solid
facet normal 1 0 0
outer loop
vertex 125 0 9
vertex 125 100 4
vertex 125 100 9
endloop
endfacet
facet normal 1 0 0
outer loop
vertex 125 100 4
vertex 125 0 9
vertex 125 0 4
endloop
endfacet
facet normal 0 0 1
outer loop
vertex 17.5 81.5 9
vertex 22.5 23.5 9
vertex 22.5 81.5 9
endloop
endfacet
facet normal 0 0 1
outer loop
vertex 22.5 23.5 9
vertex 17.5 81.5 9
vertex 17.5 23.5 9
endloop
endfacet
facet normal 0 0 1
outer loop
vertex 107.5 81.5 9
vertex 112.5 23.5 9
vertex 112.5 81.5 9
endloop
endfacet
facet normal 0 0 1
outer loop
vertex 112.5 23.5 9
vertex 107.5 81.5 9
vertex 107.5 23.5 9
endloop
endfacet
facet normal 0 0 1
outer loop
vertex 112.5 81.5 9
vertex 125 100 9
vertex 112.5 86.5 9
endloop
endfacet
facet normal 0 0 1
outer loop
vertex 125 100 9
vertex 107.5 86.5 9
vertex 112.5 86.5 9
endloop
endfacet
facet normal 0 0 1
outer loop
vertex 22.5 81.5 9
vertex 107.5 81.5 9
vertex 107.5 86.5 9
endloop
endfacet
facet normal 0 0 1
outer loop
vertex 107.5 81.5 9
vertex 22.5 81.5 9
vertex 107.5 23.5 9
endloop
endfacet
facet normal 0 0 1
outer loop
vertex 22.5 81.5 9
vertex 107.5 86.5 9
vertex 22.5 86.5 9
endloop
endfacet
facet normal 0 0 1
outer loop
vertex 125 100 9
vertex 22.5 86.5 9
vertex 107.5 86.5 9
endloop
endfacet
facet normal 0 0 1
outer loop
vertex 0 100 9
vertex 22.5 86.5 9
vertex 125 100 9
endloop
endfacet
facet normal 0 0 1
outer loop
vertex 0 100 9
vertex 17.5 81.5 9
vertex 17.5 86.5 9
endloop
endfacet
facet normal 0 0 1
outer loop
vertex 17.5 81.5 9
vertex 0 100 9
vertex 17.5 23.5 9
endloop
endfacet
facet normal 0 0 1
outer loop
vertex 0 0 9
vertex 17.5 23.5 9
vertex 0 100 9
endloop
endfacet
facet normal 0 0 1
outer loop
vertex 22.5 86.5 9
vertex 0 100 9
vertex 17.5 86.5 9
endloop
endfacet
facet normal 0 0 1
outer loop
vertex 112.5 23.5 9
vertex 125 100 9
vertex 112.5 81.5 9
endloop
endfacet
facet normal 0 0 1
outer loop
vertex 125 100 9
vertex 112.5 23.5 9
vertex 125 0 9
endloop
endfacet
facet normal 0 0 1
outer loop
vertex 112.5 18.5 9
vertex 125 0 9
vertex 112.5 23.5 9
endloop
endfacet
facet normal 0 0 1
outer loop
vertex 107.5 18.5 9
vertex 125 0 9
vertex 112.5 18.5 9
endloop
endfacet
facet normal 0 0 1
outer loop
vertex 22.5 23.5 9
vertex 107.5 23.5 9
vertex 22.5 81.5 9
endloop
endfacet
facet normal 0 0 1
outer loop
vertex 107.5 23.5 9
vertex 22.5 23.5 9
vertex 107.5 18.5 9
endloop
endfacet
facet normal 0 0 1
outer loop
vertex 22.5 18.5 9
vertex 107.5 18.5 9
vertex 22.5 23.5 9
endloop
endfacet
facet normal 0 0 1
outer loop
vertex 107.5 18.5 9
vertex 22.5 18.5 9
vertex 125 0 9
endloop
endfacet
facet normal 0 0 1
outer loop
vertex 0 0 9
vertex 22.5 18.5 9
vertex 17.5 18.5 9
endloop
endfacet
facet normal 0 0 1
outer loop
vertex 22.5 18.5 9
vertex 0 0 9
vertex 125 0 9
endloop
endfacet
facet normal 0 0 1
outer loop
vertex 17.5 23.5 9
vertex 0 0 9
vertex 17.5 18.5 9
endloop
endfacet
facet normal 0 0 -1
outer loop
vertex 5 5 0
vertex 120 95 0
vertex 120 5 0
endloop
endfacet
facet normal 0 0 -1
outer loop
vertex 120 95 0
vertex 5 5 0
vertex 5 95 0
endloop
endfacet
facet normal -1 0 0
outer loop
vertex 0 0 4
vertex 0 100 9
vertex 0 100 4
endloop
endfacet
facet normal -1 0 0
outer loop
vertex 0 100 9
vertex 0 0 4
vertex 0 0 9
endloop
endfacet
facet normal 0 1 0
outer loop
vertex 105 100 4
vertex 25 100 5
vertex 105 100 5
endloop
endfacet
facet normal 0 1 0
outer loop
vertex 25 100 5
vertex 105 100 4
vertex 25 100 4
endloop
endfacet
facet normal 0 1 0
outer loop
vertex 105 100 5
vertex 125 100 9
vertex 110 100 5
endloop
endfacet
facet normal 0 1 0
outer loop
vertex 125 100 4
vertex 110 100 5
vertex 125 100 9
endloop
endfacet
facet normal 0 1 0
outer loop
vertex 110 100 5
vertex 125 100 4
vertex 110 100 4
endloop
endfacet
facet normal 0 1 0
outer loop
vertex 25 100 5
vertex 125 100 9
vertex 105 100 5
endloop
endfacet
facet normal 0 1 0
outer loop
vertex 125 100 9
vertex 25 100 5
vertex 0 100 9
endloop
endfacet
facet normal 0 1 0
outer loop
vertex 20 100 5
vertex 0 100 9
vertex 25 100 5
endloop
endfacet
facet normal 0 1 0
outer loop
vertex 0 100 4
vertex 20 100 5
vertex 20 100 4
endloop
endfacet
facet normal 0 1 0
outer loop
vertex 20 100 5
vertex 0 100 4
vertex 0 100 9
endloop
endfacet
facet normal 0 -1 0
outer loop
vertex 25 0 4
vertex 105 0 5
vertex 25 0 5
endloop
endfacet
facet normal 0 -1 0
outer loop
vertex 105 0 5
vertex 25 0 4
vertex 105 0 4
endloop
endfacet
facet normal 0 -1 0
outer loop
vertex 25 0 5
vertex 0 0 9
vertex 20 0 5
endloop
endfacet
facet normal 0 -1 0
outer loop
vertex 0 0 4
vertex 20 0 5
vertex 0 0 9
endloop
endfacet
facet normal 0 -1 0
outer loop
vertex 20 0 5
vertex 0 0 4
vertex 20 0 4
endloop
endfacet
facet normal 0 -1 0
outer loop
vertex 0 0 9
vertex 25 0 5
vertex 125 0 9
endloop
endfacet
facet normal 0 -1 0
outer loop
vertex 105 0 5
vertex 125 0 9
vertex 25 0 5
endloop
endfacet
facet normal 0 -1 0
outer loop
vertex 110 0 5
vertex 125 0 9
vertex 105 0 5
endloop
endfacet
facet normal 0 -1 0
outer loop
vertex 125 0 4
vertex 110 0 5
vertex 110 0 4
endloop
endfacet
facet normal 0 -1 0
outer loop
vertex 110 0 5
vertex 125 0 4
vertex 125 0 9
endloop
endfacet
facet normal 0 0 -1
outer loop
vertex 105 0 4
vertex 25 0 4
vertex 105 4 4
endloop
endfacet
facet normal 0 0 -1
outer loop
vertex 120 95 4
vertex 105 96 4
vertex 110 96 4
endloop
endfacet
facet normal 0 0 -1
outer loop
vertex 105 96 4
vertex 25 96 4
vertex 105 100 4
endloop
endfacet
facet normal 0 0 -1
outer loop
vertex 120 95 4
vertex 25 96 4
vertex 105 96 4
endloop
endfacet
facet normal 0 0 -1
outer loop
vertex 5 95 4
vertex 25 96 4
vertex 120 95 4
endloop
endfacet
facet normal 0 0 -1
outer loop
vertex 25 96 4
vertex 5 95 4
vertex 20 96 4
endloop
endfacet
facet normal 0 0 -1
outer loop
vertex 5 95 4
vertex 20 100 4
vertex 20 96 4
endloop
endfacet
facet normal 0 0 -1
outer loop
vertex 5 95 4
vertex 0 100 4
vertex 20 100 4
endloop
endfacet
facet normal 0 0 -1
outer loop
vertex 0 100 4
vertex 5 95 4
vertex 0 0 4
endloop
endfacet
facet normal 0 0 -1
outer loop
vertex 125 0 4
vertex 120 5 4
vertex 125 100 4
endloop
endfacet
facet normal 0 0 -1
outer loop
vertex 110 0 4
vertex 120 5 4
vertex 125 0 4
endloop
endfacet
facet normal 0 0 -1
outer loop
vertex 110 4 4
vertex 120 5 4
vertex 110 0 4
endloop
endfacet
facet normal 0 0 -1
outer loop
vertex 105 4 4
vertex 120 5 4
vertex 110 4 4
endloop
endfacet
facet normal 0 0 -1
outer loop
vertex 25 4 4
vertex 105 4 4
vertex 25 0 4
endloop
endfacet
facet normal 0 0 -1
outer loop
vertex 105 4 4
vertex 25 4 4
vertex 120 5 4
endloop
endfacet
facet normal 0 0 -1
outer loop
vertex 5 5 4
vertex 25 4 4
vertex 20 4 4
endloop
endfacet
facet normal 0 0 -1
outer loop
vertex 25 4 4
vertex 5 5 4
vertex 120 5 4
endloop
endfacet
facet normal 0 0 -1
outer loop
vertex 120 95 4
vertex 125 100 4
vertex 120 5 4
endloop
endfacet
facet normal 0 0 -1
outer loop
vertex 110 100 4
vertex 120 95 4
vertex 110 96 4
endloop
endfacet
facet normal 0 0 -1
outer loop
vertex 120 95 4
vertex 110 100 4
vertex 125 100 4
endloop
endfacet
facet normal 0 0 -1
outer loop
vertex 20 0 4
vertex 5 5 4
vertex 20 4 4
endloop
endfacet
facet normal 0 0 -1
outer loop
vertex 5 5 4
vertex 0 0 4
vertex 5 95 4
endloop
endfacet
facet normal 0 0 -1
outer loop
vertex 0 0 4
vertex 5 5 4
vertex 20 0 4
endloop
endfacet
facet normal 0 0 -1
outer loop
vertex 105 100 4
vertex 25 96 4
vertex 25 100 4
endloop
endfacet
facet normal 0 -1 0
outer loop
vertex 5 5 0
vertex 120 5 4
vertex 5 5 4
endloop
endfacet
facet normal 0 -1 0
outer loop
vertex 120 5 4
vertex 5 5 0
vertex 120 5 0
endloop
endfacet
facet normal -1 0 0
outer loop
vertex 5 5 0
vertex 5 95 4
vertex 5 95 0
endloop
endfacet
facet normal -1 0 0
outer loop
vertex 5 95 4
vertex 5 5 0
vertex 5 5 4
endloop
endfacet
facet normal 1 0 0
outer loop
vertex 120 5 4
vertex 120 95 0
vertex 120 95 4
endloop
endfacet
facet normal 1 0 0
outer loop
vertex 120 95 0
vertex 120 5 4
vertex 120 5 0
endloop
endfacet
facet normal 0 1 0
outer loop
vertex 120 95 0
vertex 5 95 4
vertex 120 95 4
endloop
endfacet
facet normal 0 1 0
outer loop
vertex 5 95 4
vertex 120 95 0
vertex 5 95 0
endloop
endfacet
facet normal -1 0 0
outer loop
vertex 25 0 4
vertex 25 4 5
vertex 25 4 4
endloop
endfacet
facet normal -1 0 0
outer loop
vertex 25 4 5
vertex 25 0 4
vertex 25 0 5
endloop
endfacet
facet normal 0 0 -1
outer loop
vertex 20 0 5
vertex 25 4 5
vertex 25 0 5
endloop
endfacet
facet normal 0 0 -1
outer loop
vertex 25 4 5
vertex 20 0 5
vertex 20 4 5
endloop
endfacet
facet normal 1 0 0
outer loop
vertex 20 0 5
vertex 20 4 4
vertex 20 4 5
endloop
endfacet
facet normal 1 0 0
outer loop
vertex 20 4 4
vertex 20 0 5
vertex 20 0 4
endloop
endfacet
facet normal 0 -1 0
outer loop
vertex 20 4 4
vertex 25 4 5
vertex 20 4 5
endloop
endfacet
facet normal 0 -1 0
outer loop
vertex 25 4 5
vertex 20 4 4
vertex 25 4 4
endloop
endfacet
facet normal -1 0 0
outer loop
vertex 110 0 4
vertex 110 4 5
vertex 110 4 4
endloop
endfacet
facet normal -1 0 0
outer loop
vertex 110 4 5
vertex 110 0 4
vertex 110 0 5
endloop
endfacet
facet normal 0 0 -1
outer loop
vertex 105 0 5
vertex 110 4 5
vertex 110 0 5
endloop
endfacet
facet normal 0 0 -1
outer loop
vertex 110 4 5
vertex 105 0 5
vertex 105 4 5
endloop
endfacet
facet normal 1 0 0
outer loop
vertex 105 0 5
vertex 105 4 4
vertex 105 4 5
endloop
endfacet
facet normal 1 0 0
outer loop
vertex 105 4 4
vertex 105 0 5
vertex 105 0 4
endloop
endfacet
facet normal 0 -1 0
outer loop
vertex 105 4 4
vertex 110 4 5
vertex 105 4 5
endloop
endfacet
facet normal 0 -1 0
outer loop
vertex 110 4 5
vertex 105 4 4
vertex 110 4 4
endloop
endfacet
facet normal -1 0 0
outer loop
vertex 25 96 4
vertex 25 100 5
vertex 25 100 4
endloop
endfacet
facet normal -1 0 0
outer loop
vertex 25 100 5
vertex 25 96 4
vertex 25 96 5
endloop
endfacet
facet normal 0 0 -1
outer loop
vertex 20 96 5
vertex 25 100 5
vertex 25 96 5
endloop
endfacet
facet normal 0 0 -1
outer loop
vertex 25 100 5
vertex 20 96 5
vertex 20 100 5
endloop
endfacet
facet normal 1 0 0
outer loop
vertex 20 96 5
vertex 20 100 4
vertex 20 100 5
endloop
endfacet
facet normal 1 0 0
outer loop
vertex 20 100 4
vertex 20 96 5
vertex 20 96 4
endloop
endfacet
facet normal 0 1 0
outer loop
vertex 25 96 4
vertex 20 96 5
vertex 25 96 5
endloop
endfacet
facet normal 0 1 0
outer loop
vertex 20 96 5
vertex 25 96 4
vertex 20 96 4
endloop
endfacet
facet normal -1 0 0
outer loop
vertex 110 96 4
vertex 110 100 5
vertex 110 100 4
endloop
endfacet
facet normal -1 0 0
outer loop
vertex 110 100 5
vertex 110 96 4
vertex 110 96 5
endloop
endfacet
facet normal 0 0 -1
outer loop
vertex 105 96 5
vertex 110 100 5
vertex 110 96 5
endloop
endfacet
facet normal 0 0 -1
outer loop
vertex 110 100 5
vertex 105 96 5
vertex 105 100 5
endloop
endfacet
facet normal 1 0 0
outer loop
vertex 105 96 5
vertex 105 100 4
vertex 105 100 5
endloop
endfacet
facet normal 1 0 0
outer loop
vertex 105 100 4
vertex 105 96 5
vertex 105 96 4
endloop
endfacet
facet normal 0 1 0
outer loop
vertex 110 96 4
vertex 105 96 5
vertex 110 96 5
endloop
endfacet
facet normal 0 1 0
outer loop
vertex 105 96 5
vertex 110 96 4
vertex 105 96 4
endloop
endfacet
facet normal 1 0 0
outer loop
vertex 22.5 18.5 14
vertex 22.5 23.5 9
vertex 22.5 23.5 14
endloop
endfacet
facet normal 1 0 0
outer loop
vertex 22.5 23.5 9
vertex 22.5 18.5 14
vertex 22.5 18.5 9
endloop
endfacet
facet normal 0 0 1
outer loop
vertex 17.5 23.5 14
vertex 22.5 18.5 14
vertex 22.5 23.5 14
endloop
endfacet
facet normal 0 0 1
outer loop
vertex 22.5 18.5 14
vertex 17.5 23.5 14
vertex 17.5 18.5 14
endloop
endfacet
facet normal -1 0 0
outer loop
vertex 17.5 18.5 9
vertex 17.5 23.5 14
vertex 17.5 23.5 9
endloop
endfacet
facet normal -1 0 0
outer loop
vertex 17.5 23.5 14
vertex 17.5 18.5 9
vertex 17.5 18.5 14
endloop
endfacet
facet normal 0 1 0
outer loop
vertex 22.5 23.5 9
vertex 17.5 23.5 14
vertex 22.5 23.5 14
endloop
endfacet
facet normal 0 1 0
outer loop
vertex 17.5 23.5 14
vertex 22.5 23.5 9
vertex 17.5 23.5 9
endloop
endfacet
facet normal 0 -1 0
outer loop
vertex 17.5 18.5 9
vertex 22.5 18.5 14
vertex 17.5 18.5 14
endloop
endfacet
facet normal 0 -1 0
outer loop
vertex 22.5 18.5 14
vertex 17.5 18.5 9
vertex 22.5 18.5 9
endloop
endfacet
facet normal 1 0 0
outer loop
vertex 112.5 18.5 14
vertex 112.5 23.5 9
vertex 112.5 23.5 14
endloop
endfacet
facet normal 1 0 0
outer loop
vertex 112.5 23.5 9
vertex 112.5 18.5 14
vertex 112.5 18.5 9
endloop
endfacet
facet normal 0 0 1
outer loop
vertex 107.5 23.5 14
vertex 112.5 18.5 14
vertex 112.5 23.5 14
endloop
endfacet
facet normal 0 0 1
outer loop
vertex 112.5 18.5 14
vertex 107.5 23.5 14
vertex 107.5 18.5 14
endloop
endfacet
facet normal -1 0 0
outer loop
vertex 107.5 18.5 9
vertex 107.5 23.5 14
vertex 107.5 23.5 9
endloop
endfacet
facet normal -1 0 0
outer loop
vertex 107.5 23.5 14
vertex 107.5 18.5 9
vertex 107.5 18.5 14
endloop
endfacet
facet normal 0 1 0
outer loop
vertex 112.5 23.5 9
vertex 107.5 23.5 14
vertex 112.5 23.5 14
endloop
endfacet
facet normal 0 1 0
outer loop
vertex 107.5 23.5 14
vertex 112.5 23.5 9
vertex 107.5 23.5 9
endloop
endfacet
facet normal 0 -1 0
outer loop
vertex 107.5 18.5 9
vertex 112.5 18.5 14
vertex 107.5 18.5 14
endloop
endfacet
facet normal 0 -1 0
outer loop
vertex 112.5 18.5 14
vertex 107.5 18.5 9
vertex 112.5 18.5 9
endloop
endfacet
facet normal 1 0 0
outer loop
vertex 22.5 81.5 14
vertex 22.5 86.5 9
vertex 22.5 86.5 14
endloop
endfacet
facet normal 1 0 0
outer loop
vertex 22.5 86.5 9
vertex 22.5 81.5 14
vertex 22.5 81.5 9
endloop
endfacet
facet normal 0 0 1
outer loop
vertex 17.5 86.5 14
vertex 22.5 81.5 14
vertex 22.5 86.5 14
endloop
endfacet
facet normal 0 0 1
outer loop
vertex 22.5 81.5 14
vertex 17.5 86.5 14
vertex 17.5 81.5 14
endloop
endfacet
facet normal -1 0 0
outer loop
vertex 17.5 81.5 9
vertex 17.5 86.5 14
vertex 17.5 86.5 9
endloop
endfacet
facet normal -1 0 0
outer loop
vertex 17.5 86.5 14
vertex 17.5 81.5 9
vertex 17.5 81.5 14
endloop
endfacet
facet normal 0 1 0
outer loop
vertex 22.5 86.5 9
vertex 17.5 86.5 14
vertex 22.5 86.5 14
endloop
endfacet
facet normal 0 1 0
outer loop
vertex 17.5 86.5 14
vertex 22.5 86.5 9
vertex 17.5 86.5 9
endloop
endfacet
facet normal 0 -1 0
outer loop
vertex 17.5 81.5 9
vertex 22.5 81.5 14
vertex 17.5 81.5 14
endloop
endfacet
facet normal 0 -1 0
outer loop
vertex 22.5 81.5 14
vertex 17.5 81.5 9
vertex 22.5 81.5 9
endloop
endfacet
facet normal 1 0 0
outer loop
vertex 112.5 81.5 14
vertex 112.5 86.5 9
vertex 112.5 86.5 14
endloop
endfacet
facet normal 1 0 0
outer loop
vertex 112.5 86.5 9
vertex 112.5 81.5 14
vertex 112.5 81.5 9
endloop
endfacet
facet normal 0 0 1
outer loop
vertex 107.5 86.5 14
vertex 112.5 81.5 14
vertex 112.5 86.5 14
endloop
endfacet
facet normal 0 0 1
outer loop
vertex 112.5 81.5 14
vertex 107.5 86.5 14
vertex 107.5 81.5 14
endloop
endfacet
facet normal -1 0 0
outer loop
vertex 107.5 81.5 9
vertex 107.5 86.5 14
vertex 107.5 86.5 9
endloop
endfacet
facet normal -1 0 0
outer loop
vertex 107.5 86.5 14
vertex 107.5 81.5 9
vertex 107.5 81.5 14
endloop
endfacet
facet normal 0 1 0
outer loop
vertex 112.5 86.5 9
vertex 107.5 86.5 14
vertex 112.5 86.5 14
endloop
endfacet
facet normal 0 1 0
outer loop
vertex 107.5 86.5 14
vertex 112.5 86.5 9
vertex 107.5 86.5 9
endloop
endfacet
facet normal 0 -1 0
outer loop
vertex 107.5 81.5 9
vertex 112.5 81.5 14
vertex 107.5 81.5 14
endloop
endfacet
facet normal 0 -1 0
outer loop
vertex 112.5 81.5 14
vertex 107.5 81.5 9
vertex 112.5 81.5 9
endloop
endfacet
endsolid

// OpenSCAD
// file: hEX-hAP-Vars.scad
InnerW=115;
InnerD=90;
LipH=4;
Wall=5;
TabX=20;

DW=Wall*2;
OuterW=InnerW+DW;
OuterD=InnerD+DW;
Buff=1;
DB=Buff*2;
// main file
include <hEX-hAP-Vars.scad>;

InnerH=0;
PoleDistX=90;
PoleDistY=63;
PoleSQ=5;
PoleH=5;
OuterH=LipH+Wall;

PoleZ=PoleH+OuterH;
PoleX1=(OuterW/2)-(PoleDistX/2);
PoleY1=(OuterD/2)-(PoleDistY/2);
PoleX2=(OuterW/2)-(PoleDistX/2)+PoleDistX;
PoleY2=(OuterD/2)-(PoleDistY/2)+PoleDistY;


difference()
{
  cube([OuterW,OuterD,OuterH]);
    //Stacking lip
  translate([-Buff,-Buff,-Buff]) cube([OuterW+DB+Buff,Wall+Buff,LipH+Buff]);
  translate([-Buff,-Buff,-Buff]) cube([Wall+Buff,OuterD+DB,LipH+Buff]);
  translate([OuterW-Wall,-Buff,-Buff]) cube([Wall+Buff,OuterD+Buff,LipH+Buff]);
  translate([-Buff,OuterD-Wall,-Buff]) cube([OuterW+DW+Buff,Wall+DB+Buff,LipH+Buff]);
  // Prytabs
  translate([TabX,-Buff,LipH-Buff]) cube([Wall,Wall,DB]);
  translate([OuterW-TabX,-Buff,LipH-Buff]) cube([Wall,Wall,DB]);
  translate([TabX,InnerD+Wall+Buff,LipH-Buff]) cube([Wall,Wall,DB]);
  translate([OuterW-TabX,InnerD+Wall+Buff,LipH-Buff]) cube([Wall,Wall,DB]);
}

translate([PoleX1,PoleY1,0]) cube([PoleSQ,PoleSQ,PoleZ]);
translate([PoleX2,PoleY1,0]) cube([PoleSQ,PoleSQ,PoleZ]);
translate([PoleX1,PoleY2,0]) cube([PoleSQ,PoleSQ,PoleZ]);
translate([PoleX2,PoleY2,0]) cube([PoleSQ,PoleSQ,PoleZ]);
